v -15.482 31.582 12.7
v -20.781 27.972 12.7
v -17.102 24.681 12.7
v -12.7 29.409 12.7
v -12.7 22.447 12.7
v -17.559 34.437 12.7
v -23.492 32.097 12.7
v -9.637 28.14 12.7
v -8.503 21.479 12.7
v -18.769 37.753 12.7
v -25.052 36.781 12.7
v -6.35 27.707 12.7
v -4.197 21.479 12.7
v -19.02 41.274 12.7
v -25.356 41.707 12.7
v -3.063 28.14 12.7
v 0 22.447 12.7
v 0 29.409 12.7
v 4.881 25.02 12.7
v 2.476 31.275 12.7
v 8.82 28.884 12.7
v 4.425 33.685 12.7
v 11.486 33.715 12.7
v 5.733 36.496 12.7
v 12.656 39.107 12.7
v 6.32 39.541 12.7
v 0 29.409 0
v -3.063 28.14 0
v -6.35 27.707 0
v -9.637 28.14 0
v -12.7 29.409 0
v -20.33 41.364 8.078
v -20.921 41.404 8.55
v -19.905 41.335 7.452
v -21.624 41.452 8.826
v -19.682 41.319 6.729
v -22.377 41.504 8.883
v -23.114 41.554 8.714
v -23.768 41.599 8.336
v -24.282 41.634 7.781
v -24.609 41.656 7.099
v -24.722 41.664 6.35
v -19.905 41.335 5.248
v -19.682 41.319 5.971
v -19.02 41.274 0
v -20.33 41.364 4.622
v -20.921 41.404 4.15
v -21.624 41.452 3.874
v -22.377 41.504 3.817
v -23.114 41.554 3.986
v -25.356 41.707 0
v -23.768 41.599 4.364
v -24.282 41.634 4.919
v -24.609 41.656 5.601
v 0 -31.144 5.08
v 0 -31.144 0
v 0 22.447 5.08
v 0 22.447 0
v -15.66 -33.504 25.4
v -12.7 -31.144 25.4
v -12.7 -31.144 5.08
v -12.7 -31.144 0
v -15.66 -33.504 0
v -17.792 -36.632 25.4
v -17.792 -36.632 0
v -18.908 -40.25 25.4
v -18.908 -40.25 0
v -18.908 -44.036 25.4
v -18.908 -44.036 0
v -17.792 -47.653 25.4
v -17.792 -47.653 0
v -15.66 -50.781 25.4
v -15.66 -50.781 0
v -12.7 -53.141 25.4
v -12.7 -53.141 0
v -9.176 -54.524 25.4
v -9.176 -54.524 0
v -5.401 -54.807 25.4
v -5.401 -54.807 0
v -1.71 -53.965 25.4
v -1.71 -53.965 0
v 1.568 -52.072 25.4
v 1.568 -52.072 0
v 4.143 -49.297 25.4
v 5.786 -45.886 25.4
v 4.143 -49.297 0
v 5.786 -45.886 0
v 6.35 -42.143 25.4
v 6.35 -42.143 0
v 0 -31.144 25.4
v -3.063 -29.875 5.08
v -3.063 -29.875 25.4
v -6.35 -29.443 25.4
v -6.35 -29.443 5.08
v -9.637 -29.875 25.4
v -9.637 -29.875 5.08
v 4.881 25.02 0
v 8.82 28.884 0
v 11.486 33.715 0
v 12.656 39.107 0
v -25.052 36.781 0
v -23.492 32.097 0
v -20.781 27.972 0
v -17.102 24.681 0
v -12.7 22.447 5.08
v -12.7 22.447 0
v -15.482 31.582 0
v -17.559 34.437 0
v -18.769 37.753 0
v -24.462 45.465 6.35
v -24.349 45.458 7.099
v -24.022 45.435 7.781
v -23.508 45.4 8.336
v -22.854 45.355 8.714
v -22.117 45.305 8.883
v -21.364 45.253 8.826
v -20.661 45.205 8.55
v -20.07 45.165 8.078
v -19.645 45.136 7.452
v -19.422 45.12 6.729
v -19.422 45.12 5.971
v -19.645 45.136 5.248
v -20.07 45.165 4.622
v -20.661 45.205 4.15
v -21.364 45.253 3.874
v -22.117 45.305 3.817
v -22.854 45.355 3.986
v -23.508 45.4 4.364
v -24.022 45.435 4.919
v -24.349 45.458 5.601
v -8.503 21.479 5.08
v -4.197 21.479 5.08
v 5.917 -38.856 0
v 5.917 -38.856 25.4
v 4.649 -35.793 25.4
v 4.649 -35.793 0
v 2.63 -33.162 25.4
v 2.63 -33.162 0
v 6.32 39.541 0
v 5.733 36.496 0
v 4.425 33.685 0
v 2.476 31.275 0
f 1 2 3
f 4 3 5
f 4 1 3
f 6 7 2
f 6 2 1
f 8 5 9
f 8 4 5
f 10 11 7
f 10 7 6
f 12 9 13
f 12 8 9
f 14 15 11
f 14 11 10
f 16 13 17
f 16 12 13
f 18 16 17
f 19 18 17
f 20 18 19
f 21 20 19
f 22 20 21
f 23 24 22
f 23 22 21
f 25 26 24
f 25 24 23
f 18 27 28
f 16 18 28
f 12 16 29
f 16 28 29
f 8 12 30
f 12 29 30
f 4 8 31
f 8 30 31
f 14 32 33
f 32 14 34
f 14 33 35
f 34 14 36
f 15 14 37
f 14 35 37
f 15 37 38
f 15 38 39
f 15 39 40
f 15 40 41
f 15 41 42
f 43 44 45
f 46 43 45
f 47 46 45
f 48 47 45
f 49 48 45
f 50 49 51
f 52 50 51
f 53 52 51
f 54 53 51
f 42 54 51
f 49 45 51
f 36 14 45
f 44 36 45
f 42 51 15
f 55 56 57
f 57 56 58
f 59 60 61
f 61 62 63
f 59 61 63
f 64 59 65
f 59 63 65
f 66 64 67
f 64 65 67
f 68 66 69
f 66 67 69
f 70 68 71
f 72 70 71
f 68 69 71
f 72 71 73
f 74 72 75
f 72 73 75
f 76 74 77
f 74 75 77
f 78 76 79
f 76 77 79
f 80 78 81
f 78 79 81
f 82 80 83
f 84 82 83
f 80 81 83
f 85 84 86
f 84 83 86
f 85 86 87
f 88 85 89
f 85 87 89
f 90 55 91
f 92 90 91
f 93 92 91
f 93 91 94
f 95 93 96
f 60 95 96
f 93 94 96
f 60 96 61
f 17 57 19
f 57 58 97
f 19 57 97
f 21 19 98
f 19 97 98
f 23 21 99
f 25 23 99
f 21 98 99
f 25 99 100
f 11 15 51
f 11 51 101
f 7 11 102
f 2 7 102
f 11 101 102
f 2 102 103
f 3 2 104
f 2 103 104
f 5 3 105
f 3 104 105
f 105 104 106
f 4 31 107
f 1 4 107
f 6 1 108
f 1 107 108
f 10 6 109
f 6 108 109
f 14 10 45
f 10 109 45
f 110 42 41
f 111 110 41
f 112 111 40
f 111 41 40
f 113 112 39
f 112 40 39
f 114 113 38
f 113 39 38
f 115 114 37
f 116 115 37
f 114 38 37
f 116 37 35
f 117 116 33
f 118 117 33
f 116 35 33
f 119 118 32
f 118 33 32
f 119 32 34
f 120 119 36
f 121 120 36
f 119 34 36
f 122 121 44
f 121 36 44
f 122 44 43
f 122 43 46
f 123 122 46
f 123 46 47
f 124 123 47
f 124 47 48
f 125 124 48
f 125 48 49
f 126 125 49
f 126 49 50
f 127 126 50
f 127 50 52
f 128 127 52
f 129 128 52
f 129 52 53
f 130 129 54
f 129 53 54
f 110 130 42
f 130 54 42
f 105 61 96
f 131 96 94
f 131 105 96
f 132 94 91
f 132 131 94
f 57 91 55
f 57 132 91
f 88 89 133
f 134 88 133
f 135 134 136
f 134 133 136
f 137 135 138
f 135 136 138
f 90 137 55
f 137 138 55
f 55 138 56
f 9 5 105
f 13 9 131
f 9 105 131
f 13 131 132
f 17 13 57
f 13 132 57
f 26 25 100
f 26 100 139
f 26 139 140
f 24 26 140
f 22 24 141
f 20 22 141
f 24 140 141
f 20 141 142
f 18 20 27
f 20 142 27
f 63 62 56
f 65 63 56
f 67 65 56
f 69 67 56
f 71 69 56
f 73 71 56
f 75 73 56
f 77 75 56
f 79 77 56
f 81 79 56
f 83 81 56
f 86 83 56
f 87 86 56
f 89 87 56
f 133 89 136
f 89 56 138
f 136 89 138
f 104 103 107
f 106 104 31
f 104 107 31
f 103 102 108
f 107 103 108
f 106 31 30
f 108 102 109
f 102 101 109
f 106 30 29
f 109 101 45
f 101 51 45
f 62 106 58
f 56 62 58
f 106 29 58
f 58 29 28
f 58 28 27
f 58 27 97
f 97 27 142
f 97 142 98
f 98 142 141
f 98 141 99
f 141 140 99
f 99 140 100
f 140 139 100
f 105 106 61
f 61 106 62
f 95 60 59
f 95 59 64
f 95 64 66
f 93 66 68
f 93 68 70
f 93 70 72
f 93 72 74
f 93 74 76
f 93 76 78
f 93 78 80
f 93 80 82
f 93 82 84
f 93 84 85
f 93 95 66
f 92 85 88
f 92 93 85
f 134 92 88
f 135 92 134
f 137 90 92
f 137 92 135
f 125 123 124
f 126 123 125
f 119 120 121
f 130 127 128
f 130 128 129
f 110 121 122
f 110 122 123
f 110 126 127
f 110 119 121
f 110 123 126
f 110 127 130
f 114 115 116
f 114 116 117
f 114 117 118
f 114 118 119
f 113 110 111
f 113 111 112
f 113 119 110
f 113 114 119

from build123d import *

# Parameters (mm, degrees)
F1_DEPTH = 12.7
F2_DEPTH = 5.08
F3_DEPTH = 25.4
F4_R     = 2.54
F5_DEPTH = 3.81


with BuildPart() as f1:
    # F0 (on Top) → F1 (new body)
    with BuildSketch(Plane.XY):
        with BuildLine():
            Line((-12.7, 29.4087881439), (-12.7, 22.4467985298))
            ThreePointArc((-12.7, 22.4467985298), (-6.35, 21.3573107719), (0, 22.4467985298))
            Line((0, 22.4467985298), (0, 29.4087881439))
            ThreePointArc((0, 29.4087881439), (-6.35, 27.7073107719), (-12.7, 29.4087881439))
        make_face()
        with BuildLine():
            ThreePointArc((-25.3555783398, 41.7074999772), (-22.2707409783, 29.9463114553), (-12.7, 22.4467985298))
            Line((-12.7, 22.4467985298), (-12.7, 29.4087881439))
            ThreePointArc((-12.7, 29.4087881439), (-17.5589336819, 34.4365649462), (-19.0203855599, 41.2741035754))
            Line((-19.0203855599, 41.2741035754), (-25.3555783398, 41.7074999772))
        make_face()
        with BuildLine():
            Line((0, 29.4087881439), (0, 22.4467985298))
            ThreePointArc((0, 22.4467985298), (8.8196383991, 28.8840920011), (12.6555783398, 39.1071215667))
            Line((12.6555783398, 39.1071215667), (6.3203855599, 39.5405179684))
            ThreePointArc((6.3203855599, 39.5405179684), (4.4252844056, 33.685462367), (0, 29.4087881439))
        make_face()
    extrude(amount=F1_DEPTH)

    # F0 (on Top) → F2 (join)
    with BuildSketch(Plane.XY):
        with BuildLine():
            Line((-12.7, 22.4467985298), (-12.7, -31.1441666))
            ThreePointArc((-12.7, -31.1441666), (-6.35, -29.4426892281), (0, -31.1441666))
            Line((0, -31.1441666), (0, 22.4467985298))
            ThreePointArc((0, 22.4467985298), (-6.35, 21.3573107719), (-12.7, 22.4467985298))
        make_face()
    extrude(amount=F2_DEPTH)

    # F0 (on Top) → F3 (join)
    with BuildSketch(Plane.XY):
        with BuildLine():
            Line((-12.7, -31.1441666), (-12.7, -42.1426892281))
            Line((-12.7, -42.1426892281), (-6.35, -42.1426892281))
            Line((-6.35, -42.1426892281), (0, -42.1426892281))
            Line((0, -42.1426892281), (0, -31.1441666))
            ThreePointArc((0, -31.1441666), (-6.35, -29.4426892281), (-12.7, -31.1441666))
        make_face()
        with BuildLine():
            Line((-6.35, -42.1426892281), (-12.7, -42.1426892281))
            Line((-12.7, -42.1426892281), (-12.7, -31.1441666))
            ThreePointArc((-12.7, -31.1441666), (-12.7, -53.1412118561), (6.35, -42.1426892281))
            ThreePointArc((6.35, -42.1426892281), (4.6485226281, -35.7926892281), (0, -31.1441666))
            Line((0, -31.1441666), (0, -42.1426892281))
            Line((0, -42.1426892281), (-6.35, -42.1426892281))
        make_face()
    extrude(amount=F3_DEPTH)

    # F4 (on face) → F5 (join)
    with BuildSketch(Plane(origin=(2.7218447995, 39.7866974726, 0), x_dir=(-0.9976681543, 0.0682514019, 0), z_dir=(0.0682514019, 0.9976681543, 0))):
        with Locations((24.9680483851, 6.35)):
            Circle(F4_R)
    extrude(amount=F5_DEPTH)


solid = f1.part
